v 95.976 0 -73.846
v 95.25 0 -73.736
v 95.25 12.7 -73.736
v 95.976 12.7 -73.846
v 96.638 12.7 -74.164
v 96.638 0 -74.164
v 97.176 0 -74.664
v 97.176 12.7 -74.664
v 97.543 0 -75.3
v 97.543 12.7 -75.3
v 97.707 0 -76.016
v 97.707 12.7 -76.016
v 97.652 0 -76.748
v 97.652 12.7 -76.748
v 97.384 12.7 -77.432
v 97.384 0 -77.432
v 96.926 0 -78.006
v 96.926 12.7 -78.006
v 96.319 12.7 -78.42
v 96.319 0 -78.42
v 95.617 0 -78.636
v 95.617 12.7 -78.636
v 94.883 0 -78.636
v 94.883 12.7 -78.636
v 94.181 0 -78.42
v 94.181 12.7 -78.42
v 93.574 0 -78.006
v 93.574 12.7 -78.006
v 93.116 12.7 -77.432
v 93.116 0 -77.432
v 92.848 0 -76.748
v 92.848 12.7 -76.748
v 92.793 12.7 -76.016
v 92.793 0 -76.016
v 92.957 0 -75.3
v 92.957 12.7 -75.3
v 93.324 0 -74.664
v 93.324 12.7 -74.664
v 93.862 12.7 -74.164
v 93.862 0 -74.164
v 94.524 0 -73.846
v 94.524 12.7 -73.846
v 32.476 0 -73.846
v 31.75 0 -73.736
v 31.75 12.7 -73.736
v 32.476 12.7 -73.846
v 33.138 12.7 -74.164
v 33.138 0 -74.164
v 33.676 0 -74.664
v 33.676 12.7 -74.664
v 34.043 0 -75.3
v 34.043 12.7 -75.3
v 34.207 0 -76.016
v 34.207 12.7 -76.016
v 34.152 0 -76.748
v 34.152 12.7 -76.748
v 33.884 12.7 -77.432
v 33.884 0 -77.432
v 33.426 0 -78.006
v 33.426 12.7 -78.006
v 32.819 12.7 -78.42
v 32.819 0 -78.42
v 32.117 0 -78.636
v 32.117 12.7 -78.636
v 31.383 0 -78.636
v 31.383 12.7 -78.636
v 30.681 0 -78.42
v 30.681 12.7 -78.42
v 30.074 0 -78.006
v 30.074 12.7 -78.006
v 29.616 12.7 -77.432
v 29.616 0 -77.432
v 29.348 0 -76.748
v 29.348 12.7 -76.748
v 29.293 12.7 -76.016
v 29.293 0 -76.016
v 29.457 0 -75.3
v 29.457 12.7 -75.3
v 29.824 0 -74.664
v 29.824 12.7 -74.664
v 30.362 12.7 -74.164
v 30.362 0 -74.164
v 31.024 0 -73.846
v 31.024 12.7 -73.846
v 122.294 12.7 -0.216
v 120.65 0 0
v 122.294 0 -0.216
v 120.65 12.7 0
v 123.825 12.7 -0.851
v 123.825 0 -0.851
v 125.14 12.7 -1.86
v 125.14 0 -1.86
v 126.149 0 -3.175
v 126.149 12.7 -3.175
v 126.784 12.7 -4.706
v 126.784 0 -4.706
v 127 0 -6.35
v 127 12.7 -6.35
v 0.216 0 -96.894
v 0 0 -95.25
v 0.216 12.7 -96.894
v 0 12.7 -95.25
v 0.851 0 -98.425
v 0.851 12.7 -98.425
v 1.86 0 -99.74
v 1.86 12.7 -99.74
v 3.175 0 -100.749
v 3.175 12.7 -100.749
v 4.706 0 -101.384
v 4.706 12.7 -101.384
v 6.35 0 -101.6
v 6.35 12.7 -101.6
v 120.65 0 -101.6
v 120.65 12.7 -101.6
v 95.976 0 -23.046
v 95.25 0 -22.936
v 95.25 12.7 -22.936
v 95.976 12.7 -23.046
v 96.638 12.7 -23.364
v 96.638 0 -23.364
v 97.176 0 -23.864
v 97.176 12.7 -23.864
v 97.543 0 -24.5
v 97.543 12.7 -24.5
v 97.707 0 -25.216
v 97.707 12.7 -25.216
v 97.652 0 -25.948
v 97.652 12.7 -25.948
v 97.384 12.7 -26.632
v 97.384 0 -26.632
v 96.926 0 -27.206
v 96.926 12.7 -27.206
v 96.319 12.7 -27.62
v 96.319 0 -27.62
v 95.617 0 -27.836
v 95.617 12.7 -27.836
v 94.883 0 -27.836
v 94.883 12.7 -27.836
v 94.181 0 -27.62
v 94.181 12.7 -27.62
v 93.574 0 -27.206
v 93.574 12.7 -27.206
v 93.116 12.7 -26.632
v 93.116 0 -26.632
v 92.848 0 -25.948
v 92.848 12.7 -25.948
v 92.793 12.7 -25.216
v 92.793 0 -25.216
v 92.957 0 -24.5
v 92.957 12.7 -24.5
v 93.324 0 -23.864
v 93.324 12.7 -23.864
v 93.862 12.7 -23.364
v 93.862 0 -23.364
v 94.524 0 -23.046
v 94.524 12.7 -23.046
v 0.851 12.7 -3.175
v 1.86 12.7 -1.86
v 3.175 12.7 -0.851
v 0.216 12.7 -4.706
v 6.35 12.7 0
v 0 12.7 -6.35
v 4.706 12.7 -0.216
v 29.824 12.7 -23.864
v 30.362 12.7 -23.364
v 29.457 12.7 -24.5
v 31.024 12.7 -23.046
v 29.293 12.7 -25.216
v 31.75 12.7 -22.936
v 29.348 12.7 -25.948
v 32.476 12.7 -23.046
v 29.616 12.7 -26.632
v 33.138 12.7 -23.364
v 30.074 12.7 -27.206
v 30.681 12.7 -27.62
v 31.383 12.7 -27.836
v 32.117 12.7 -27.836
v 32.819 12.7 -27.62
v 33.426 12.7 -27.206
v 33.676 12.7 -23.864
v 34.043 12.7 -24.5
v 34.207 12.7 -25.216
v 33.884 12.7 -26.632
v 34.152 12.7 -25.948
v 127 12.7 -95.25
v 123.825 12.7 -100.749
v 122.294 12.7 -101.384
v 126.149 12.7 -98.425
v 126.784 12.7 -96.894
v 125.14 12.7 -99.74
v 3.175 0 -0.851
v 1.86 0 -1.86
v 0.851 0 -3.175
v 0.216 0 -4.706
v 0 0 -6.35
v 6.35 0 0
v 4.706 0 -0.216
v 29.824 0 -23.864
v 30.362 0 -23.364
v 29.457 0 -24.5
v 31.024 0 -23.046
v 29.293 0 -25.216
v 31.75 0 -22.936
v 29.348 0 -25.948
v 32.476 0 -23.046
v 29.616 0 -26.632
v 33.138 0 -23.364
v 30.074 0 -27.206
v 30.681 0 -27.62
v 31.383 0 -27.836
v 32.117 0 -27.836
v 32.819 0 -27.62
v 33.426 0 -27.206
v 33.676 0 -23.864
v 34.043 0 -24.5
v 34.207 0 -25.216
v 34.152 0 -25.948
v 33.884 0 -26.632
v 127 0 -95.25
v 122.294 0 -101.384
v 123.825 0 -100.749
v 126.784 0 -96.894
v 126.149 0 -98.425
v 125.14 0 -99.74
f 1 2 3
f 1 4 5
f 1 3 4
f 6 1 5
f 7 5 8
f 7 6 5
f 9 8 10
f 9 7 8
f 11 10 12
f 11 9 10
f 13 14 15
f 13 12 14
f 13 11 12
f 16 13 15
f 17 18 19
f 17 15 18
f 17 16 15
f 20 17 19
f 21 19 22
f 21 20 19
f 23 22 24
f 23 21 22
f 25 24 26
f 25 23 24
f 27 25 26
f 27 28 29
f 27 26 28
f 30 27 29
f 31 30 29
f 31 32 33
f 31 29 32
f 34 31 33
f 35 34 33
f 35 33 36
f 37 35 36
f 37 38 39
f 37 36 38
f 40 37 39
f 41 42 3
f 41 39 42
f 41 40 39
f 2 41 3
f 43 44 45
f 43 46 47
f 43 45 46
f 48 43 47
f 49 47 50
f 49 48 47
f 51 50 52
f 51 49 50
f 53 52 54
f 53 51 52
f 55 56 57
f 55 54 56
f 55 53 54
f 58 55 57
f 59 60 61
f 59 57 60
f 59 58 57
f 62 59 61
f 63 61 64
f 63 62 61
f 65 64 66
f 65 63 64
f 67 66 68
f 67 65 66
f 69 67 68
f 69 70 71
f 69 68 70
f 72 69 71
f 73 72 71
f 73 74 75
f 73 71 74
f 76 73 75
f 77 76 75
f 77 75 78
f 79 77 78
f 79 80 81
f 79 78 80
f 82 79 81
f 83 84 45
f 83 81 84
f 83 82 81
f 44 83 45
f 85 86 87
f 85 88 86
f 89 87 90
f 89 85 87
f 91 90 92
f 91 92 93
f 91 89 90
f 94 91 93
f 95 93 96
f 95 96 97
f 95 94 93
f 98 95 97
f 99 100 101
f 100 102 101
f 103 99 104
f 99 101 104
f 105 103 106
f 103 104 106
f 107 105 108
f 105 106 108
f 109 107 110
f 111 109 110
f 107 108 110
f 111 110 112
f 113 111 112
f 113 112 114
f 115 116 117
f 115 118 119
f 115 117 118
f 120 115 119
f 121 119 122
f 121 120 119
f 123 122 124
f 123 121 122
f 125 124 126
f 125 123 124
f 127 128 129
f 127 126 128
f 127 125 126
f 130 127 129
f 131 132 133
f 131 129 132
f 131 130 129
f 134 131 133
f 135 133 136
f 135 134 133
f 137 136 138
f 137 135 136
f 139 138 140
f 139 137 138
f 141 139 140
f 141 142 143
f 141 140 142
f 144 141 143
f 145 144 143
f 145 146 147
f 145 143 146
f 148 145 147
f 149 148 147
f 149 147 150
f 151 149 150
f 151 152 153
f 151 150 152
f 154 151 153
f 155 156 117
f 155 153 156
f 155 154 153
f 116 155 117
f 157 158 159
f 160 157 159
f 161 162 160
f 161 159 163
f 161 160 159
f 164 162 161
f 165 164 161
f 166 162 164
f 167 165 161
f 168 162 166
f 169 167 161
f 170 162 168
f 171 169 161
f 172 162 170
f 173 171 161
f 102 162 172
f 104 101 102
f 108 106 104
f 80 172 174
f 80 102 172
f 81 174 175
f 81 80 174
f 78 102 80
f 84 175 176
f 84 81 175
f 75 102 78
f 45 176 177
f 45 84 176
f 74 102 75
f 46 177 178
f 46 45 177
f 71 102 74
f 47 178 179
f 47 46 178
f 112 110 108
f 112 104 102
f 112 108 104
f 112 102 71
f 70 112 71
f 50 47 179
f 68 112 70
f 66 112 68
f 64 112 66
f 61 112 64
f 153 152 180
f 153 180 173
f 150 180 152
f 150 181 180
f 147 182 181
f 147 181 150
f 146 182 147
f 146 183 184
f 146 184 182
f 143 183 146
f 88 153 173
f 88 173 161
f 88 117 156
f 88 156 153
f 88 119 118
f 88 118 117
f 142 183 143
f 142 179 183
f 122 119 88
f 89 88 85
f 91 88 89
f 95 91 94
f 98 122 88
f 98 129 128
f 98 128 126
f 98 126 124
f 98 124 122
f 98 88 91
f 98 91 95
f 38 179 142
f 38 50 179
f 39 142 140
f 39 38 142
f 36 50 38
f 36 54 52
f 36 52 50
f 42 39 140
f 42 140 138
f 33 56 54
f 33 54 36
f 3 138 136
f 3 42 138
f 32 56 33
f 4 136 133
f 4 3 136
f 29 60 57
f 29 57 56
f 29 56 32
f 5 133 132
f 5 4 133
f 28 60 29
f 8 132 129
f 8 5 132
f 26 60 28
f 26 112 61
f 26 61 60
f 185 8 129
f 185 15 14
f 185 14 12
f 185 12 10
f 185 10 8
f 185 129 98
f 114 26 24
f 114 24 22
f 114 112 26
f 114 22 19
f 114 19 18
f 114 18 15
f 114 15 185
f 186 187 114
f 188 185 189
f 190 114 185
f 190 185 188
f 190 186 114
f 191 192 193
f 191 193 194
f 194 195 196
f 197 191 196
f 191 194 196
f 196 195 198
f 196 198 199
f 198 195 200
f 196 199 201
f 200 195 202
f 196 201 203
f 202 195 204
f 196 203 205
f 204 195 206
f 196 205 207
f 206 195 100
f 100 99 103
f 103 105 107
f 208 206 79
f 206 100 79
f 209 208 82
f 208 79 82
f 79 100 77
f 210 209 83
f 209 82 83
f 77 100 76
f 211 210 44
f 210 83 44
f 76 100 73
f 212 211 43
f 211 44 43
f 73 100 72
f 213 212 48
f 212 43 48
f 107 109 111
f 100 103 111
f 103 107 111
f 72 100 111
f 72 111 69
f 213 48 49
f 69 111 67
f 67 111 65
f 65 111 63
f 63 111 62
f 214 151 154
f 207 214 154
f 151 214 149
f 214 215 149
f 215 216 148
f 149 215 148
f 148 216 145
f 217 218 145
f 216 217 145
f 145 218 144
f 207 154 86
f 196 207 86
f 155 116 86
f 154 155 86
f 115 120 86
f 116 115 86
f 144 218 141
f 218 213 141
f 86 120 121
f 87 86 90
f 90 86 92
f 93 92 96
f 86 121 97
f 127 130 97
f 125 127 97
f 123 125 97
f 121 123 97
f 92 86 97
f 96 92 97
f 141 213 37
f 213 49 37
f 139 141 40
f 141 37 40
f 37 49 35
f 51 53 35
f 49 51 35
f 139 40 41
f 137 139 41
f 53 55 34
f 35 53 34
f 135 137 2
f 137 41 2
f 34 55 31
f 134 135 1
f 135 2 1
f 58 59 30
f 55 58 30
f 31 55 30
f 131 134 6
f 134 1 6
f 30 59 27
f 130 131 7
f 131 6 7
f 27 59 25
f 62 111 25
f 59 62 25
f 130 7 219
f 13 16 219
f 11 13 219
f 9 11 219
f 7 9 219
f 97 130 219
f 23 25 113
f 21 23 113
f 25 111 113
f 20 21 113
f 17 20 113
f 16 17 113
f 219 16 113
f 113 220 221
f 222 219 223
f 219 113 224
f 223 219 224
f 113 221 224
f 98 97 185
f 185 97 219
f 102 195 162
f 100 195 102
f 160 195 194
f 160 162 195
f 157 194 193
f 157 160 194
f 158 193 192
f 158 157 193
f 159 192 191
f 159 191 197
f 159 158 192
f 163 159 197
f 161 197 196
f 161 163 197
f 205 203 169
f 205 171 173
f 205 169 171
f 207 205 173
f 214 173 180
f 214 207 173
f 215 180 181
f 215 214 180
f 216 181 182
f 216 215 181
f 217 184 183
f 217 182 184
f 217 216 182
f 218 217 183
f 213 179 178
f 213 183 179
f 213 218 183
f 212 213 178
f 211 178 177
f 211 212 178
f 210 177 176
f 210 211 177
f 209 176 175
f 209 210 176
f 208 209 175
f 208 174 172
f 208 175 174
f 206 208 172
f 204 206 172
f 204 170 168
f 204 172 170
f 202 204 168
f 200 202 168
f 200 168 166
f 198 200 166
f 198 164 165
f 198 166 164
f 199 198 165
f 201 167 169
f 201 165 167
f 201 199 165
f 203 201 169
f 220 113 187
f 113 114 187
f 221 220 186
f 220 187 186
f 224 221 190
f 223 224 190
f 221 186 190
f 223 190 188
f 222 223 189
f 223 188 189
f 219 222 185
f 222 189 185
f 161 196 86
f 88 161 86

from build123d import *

# Parameters (mm, degrees)
SKETCH1_W               = 127
SKETCH1_H               = 101.6
BOSS_EXTRUDE1_DEPTH     = 12.7
CUT_EXTRUDE1_DEPTH      = 164.134453749
CUT_EXTRUDE1_DEPTH_BACK = 164.134453749
SKETCH2_R               = 2.4638
FILLET1_R               = 6.35


with BuildPart() as part:
    # Sketch1 → Boss-Extrude1 (new body)
    with BuildSketch(Plane(origin=(0, 0, 0), x_dir=(1, 0, 0), z_dir=(0, 1, 0))):
        with Locations((63.5, 50.8)):
            Rectangle(SKETCH1_W, SKETCH1_H)
    extrude(amount=BOSS_EXTRUDE1_DEPTH)

    # Sketch2 → Cut-Extrude1 (cut, two sides: drawn at the far end of the back side and taken through both)
    with BuildSketch(Plane(origin=(0, 12.7, 0), x_dir=(1, 0, 0), z_dir=(0, 1, 0)).offset(-CUT_EXTRUDE1_DEPTH_BACK)):
        with Locations(Location((31.75, 76.2, 0), (0, 0, 270))):
            Circle(SKETCH2_R)
        with Locations(Location((95.25, 76.2, 0), (0, 0, 270))):
            Circle(SKETCH2_R)
        with Locations(Location((95.25, 25.4, 0), (0, 0, 270))):
            Circle(SKETCH2_R)
        with Locations(Location((31.75, 25.4, 0), (0, 0, 270))):
            Circle(SKETCH2_R)
    extrude(amount=CUT_EXTRUDE1_DEPTH + CUT_EXTRUDE1_DEPTH_BACK, mode=Mode.SUBTRACT)

    # Fillet1
    fillet1_edges = [part.edges().sort_by_distance(p)[0] for p in [
        (0, 6.35, -101.6),
        (127, 6.35, -101.6),
        (127, 6.35, 0),
        (0, 6.35, 0),
    ]]
    fillet(fillet1_edges, radius=FILLET1_R)


solid = part.part
